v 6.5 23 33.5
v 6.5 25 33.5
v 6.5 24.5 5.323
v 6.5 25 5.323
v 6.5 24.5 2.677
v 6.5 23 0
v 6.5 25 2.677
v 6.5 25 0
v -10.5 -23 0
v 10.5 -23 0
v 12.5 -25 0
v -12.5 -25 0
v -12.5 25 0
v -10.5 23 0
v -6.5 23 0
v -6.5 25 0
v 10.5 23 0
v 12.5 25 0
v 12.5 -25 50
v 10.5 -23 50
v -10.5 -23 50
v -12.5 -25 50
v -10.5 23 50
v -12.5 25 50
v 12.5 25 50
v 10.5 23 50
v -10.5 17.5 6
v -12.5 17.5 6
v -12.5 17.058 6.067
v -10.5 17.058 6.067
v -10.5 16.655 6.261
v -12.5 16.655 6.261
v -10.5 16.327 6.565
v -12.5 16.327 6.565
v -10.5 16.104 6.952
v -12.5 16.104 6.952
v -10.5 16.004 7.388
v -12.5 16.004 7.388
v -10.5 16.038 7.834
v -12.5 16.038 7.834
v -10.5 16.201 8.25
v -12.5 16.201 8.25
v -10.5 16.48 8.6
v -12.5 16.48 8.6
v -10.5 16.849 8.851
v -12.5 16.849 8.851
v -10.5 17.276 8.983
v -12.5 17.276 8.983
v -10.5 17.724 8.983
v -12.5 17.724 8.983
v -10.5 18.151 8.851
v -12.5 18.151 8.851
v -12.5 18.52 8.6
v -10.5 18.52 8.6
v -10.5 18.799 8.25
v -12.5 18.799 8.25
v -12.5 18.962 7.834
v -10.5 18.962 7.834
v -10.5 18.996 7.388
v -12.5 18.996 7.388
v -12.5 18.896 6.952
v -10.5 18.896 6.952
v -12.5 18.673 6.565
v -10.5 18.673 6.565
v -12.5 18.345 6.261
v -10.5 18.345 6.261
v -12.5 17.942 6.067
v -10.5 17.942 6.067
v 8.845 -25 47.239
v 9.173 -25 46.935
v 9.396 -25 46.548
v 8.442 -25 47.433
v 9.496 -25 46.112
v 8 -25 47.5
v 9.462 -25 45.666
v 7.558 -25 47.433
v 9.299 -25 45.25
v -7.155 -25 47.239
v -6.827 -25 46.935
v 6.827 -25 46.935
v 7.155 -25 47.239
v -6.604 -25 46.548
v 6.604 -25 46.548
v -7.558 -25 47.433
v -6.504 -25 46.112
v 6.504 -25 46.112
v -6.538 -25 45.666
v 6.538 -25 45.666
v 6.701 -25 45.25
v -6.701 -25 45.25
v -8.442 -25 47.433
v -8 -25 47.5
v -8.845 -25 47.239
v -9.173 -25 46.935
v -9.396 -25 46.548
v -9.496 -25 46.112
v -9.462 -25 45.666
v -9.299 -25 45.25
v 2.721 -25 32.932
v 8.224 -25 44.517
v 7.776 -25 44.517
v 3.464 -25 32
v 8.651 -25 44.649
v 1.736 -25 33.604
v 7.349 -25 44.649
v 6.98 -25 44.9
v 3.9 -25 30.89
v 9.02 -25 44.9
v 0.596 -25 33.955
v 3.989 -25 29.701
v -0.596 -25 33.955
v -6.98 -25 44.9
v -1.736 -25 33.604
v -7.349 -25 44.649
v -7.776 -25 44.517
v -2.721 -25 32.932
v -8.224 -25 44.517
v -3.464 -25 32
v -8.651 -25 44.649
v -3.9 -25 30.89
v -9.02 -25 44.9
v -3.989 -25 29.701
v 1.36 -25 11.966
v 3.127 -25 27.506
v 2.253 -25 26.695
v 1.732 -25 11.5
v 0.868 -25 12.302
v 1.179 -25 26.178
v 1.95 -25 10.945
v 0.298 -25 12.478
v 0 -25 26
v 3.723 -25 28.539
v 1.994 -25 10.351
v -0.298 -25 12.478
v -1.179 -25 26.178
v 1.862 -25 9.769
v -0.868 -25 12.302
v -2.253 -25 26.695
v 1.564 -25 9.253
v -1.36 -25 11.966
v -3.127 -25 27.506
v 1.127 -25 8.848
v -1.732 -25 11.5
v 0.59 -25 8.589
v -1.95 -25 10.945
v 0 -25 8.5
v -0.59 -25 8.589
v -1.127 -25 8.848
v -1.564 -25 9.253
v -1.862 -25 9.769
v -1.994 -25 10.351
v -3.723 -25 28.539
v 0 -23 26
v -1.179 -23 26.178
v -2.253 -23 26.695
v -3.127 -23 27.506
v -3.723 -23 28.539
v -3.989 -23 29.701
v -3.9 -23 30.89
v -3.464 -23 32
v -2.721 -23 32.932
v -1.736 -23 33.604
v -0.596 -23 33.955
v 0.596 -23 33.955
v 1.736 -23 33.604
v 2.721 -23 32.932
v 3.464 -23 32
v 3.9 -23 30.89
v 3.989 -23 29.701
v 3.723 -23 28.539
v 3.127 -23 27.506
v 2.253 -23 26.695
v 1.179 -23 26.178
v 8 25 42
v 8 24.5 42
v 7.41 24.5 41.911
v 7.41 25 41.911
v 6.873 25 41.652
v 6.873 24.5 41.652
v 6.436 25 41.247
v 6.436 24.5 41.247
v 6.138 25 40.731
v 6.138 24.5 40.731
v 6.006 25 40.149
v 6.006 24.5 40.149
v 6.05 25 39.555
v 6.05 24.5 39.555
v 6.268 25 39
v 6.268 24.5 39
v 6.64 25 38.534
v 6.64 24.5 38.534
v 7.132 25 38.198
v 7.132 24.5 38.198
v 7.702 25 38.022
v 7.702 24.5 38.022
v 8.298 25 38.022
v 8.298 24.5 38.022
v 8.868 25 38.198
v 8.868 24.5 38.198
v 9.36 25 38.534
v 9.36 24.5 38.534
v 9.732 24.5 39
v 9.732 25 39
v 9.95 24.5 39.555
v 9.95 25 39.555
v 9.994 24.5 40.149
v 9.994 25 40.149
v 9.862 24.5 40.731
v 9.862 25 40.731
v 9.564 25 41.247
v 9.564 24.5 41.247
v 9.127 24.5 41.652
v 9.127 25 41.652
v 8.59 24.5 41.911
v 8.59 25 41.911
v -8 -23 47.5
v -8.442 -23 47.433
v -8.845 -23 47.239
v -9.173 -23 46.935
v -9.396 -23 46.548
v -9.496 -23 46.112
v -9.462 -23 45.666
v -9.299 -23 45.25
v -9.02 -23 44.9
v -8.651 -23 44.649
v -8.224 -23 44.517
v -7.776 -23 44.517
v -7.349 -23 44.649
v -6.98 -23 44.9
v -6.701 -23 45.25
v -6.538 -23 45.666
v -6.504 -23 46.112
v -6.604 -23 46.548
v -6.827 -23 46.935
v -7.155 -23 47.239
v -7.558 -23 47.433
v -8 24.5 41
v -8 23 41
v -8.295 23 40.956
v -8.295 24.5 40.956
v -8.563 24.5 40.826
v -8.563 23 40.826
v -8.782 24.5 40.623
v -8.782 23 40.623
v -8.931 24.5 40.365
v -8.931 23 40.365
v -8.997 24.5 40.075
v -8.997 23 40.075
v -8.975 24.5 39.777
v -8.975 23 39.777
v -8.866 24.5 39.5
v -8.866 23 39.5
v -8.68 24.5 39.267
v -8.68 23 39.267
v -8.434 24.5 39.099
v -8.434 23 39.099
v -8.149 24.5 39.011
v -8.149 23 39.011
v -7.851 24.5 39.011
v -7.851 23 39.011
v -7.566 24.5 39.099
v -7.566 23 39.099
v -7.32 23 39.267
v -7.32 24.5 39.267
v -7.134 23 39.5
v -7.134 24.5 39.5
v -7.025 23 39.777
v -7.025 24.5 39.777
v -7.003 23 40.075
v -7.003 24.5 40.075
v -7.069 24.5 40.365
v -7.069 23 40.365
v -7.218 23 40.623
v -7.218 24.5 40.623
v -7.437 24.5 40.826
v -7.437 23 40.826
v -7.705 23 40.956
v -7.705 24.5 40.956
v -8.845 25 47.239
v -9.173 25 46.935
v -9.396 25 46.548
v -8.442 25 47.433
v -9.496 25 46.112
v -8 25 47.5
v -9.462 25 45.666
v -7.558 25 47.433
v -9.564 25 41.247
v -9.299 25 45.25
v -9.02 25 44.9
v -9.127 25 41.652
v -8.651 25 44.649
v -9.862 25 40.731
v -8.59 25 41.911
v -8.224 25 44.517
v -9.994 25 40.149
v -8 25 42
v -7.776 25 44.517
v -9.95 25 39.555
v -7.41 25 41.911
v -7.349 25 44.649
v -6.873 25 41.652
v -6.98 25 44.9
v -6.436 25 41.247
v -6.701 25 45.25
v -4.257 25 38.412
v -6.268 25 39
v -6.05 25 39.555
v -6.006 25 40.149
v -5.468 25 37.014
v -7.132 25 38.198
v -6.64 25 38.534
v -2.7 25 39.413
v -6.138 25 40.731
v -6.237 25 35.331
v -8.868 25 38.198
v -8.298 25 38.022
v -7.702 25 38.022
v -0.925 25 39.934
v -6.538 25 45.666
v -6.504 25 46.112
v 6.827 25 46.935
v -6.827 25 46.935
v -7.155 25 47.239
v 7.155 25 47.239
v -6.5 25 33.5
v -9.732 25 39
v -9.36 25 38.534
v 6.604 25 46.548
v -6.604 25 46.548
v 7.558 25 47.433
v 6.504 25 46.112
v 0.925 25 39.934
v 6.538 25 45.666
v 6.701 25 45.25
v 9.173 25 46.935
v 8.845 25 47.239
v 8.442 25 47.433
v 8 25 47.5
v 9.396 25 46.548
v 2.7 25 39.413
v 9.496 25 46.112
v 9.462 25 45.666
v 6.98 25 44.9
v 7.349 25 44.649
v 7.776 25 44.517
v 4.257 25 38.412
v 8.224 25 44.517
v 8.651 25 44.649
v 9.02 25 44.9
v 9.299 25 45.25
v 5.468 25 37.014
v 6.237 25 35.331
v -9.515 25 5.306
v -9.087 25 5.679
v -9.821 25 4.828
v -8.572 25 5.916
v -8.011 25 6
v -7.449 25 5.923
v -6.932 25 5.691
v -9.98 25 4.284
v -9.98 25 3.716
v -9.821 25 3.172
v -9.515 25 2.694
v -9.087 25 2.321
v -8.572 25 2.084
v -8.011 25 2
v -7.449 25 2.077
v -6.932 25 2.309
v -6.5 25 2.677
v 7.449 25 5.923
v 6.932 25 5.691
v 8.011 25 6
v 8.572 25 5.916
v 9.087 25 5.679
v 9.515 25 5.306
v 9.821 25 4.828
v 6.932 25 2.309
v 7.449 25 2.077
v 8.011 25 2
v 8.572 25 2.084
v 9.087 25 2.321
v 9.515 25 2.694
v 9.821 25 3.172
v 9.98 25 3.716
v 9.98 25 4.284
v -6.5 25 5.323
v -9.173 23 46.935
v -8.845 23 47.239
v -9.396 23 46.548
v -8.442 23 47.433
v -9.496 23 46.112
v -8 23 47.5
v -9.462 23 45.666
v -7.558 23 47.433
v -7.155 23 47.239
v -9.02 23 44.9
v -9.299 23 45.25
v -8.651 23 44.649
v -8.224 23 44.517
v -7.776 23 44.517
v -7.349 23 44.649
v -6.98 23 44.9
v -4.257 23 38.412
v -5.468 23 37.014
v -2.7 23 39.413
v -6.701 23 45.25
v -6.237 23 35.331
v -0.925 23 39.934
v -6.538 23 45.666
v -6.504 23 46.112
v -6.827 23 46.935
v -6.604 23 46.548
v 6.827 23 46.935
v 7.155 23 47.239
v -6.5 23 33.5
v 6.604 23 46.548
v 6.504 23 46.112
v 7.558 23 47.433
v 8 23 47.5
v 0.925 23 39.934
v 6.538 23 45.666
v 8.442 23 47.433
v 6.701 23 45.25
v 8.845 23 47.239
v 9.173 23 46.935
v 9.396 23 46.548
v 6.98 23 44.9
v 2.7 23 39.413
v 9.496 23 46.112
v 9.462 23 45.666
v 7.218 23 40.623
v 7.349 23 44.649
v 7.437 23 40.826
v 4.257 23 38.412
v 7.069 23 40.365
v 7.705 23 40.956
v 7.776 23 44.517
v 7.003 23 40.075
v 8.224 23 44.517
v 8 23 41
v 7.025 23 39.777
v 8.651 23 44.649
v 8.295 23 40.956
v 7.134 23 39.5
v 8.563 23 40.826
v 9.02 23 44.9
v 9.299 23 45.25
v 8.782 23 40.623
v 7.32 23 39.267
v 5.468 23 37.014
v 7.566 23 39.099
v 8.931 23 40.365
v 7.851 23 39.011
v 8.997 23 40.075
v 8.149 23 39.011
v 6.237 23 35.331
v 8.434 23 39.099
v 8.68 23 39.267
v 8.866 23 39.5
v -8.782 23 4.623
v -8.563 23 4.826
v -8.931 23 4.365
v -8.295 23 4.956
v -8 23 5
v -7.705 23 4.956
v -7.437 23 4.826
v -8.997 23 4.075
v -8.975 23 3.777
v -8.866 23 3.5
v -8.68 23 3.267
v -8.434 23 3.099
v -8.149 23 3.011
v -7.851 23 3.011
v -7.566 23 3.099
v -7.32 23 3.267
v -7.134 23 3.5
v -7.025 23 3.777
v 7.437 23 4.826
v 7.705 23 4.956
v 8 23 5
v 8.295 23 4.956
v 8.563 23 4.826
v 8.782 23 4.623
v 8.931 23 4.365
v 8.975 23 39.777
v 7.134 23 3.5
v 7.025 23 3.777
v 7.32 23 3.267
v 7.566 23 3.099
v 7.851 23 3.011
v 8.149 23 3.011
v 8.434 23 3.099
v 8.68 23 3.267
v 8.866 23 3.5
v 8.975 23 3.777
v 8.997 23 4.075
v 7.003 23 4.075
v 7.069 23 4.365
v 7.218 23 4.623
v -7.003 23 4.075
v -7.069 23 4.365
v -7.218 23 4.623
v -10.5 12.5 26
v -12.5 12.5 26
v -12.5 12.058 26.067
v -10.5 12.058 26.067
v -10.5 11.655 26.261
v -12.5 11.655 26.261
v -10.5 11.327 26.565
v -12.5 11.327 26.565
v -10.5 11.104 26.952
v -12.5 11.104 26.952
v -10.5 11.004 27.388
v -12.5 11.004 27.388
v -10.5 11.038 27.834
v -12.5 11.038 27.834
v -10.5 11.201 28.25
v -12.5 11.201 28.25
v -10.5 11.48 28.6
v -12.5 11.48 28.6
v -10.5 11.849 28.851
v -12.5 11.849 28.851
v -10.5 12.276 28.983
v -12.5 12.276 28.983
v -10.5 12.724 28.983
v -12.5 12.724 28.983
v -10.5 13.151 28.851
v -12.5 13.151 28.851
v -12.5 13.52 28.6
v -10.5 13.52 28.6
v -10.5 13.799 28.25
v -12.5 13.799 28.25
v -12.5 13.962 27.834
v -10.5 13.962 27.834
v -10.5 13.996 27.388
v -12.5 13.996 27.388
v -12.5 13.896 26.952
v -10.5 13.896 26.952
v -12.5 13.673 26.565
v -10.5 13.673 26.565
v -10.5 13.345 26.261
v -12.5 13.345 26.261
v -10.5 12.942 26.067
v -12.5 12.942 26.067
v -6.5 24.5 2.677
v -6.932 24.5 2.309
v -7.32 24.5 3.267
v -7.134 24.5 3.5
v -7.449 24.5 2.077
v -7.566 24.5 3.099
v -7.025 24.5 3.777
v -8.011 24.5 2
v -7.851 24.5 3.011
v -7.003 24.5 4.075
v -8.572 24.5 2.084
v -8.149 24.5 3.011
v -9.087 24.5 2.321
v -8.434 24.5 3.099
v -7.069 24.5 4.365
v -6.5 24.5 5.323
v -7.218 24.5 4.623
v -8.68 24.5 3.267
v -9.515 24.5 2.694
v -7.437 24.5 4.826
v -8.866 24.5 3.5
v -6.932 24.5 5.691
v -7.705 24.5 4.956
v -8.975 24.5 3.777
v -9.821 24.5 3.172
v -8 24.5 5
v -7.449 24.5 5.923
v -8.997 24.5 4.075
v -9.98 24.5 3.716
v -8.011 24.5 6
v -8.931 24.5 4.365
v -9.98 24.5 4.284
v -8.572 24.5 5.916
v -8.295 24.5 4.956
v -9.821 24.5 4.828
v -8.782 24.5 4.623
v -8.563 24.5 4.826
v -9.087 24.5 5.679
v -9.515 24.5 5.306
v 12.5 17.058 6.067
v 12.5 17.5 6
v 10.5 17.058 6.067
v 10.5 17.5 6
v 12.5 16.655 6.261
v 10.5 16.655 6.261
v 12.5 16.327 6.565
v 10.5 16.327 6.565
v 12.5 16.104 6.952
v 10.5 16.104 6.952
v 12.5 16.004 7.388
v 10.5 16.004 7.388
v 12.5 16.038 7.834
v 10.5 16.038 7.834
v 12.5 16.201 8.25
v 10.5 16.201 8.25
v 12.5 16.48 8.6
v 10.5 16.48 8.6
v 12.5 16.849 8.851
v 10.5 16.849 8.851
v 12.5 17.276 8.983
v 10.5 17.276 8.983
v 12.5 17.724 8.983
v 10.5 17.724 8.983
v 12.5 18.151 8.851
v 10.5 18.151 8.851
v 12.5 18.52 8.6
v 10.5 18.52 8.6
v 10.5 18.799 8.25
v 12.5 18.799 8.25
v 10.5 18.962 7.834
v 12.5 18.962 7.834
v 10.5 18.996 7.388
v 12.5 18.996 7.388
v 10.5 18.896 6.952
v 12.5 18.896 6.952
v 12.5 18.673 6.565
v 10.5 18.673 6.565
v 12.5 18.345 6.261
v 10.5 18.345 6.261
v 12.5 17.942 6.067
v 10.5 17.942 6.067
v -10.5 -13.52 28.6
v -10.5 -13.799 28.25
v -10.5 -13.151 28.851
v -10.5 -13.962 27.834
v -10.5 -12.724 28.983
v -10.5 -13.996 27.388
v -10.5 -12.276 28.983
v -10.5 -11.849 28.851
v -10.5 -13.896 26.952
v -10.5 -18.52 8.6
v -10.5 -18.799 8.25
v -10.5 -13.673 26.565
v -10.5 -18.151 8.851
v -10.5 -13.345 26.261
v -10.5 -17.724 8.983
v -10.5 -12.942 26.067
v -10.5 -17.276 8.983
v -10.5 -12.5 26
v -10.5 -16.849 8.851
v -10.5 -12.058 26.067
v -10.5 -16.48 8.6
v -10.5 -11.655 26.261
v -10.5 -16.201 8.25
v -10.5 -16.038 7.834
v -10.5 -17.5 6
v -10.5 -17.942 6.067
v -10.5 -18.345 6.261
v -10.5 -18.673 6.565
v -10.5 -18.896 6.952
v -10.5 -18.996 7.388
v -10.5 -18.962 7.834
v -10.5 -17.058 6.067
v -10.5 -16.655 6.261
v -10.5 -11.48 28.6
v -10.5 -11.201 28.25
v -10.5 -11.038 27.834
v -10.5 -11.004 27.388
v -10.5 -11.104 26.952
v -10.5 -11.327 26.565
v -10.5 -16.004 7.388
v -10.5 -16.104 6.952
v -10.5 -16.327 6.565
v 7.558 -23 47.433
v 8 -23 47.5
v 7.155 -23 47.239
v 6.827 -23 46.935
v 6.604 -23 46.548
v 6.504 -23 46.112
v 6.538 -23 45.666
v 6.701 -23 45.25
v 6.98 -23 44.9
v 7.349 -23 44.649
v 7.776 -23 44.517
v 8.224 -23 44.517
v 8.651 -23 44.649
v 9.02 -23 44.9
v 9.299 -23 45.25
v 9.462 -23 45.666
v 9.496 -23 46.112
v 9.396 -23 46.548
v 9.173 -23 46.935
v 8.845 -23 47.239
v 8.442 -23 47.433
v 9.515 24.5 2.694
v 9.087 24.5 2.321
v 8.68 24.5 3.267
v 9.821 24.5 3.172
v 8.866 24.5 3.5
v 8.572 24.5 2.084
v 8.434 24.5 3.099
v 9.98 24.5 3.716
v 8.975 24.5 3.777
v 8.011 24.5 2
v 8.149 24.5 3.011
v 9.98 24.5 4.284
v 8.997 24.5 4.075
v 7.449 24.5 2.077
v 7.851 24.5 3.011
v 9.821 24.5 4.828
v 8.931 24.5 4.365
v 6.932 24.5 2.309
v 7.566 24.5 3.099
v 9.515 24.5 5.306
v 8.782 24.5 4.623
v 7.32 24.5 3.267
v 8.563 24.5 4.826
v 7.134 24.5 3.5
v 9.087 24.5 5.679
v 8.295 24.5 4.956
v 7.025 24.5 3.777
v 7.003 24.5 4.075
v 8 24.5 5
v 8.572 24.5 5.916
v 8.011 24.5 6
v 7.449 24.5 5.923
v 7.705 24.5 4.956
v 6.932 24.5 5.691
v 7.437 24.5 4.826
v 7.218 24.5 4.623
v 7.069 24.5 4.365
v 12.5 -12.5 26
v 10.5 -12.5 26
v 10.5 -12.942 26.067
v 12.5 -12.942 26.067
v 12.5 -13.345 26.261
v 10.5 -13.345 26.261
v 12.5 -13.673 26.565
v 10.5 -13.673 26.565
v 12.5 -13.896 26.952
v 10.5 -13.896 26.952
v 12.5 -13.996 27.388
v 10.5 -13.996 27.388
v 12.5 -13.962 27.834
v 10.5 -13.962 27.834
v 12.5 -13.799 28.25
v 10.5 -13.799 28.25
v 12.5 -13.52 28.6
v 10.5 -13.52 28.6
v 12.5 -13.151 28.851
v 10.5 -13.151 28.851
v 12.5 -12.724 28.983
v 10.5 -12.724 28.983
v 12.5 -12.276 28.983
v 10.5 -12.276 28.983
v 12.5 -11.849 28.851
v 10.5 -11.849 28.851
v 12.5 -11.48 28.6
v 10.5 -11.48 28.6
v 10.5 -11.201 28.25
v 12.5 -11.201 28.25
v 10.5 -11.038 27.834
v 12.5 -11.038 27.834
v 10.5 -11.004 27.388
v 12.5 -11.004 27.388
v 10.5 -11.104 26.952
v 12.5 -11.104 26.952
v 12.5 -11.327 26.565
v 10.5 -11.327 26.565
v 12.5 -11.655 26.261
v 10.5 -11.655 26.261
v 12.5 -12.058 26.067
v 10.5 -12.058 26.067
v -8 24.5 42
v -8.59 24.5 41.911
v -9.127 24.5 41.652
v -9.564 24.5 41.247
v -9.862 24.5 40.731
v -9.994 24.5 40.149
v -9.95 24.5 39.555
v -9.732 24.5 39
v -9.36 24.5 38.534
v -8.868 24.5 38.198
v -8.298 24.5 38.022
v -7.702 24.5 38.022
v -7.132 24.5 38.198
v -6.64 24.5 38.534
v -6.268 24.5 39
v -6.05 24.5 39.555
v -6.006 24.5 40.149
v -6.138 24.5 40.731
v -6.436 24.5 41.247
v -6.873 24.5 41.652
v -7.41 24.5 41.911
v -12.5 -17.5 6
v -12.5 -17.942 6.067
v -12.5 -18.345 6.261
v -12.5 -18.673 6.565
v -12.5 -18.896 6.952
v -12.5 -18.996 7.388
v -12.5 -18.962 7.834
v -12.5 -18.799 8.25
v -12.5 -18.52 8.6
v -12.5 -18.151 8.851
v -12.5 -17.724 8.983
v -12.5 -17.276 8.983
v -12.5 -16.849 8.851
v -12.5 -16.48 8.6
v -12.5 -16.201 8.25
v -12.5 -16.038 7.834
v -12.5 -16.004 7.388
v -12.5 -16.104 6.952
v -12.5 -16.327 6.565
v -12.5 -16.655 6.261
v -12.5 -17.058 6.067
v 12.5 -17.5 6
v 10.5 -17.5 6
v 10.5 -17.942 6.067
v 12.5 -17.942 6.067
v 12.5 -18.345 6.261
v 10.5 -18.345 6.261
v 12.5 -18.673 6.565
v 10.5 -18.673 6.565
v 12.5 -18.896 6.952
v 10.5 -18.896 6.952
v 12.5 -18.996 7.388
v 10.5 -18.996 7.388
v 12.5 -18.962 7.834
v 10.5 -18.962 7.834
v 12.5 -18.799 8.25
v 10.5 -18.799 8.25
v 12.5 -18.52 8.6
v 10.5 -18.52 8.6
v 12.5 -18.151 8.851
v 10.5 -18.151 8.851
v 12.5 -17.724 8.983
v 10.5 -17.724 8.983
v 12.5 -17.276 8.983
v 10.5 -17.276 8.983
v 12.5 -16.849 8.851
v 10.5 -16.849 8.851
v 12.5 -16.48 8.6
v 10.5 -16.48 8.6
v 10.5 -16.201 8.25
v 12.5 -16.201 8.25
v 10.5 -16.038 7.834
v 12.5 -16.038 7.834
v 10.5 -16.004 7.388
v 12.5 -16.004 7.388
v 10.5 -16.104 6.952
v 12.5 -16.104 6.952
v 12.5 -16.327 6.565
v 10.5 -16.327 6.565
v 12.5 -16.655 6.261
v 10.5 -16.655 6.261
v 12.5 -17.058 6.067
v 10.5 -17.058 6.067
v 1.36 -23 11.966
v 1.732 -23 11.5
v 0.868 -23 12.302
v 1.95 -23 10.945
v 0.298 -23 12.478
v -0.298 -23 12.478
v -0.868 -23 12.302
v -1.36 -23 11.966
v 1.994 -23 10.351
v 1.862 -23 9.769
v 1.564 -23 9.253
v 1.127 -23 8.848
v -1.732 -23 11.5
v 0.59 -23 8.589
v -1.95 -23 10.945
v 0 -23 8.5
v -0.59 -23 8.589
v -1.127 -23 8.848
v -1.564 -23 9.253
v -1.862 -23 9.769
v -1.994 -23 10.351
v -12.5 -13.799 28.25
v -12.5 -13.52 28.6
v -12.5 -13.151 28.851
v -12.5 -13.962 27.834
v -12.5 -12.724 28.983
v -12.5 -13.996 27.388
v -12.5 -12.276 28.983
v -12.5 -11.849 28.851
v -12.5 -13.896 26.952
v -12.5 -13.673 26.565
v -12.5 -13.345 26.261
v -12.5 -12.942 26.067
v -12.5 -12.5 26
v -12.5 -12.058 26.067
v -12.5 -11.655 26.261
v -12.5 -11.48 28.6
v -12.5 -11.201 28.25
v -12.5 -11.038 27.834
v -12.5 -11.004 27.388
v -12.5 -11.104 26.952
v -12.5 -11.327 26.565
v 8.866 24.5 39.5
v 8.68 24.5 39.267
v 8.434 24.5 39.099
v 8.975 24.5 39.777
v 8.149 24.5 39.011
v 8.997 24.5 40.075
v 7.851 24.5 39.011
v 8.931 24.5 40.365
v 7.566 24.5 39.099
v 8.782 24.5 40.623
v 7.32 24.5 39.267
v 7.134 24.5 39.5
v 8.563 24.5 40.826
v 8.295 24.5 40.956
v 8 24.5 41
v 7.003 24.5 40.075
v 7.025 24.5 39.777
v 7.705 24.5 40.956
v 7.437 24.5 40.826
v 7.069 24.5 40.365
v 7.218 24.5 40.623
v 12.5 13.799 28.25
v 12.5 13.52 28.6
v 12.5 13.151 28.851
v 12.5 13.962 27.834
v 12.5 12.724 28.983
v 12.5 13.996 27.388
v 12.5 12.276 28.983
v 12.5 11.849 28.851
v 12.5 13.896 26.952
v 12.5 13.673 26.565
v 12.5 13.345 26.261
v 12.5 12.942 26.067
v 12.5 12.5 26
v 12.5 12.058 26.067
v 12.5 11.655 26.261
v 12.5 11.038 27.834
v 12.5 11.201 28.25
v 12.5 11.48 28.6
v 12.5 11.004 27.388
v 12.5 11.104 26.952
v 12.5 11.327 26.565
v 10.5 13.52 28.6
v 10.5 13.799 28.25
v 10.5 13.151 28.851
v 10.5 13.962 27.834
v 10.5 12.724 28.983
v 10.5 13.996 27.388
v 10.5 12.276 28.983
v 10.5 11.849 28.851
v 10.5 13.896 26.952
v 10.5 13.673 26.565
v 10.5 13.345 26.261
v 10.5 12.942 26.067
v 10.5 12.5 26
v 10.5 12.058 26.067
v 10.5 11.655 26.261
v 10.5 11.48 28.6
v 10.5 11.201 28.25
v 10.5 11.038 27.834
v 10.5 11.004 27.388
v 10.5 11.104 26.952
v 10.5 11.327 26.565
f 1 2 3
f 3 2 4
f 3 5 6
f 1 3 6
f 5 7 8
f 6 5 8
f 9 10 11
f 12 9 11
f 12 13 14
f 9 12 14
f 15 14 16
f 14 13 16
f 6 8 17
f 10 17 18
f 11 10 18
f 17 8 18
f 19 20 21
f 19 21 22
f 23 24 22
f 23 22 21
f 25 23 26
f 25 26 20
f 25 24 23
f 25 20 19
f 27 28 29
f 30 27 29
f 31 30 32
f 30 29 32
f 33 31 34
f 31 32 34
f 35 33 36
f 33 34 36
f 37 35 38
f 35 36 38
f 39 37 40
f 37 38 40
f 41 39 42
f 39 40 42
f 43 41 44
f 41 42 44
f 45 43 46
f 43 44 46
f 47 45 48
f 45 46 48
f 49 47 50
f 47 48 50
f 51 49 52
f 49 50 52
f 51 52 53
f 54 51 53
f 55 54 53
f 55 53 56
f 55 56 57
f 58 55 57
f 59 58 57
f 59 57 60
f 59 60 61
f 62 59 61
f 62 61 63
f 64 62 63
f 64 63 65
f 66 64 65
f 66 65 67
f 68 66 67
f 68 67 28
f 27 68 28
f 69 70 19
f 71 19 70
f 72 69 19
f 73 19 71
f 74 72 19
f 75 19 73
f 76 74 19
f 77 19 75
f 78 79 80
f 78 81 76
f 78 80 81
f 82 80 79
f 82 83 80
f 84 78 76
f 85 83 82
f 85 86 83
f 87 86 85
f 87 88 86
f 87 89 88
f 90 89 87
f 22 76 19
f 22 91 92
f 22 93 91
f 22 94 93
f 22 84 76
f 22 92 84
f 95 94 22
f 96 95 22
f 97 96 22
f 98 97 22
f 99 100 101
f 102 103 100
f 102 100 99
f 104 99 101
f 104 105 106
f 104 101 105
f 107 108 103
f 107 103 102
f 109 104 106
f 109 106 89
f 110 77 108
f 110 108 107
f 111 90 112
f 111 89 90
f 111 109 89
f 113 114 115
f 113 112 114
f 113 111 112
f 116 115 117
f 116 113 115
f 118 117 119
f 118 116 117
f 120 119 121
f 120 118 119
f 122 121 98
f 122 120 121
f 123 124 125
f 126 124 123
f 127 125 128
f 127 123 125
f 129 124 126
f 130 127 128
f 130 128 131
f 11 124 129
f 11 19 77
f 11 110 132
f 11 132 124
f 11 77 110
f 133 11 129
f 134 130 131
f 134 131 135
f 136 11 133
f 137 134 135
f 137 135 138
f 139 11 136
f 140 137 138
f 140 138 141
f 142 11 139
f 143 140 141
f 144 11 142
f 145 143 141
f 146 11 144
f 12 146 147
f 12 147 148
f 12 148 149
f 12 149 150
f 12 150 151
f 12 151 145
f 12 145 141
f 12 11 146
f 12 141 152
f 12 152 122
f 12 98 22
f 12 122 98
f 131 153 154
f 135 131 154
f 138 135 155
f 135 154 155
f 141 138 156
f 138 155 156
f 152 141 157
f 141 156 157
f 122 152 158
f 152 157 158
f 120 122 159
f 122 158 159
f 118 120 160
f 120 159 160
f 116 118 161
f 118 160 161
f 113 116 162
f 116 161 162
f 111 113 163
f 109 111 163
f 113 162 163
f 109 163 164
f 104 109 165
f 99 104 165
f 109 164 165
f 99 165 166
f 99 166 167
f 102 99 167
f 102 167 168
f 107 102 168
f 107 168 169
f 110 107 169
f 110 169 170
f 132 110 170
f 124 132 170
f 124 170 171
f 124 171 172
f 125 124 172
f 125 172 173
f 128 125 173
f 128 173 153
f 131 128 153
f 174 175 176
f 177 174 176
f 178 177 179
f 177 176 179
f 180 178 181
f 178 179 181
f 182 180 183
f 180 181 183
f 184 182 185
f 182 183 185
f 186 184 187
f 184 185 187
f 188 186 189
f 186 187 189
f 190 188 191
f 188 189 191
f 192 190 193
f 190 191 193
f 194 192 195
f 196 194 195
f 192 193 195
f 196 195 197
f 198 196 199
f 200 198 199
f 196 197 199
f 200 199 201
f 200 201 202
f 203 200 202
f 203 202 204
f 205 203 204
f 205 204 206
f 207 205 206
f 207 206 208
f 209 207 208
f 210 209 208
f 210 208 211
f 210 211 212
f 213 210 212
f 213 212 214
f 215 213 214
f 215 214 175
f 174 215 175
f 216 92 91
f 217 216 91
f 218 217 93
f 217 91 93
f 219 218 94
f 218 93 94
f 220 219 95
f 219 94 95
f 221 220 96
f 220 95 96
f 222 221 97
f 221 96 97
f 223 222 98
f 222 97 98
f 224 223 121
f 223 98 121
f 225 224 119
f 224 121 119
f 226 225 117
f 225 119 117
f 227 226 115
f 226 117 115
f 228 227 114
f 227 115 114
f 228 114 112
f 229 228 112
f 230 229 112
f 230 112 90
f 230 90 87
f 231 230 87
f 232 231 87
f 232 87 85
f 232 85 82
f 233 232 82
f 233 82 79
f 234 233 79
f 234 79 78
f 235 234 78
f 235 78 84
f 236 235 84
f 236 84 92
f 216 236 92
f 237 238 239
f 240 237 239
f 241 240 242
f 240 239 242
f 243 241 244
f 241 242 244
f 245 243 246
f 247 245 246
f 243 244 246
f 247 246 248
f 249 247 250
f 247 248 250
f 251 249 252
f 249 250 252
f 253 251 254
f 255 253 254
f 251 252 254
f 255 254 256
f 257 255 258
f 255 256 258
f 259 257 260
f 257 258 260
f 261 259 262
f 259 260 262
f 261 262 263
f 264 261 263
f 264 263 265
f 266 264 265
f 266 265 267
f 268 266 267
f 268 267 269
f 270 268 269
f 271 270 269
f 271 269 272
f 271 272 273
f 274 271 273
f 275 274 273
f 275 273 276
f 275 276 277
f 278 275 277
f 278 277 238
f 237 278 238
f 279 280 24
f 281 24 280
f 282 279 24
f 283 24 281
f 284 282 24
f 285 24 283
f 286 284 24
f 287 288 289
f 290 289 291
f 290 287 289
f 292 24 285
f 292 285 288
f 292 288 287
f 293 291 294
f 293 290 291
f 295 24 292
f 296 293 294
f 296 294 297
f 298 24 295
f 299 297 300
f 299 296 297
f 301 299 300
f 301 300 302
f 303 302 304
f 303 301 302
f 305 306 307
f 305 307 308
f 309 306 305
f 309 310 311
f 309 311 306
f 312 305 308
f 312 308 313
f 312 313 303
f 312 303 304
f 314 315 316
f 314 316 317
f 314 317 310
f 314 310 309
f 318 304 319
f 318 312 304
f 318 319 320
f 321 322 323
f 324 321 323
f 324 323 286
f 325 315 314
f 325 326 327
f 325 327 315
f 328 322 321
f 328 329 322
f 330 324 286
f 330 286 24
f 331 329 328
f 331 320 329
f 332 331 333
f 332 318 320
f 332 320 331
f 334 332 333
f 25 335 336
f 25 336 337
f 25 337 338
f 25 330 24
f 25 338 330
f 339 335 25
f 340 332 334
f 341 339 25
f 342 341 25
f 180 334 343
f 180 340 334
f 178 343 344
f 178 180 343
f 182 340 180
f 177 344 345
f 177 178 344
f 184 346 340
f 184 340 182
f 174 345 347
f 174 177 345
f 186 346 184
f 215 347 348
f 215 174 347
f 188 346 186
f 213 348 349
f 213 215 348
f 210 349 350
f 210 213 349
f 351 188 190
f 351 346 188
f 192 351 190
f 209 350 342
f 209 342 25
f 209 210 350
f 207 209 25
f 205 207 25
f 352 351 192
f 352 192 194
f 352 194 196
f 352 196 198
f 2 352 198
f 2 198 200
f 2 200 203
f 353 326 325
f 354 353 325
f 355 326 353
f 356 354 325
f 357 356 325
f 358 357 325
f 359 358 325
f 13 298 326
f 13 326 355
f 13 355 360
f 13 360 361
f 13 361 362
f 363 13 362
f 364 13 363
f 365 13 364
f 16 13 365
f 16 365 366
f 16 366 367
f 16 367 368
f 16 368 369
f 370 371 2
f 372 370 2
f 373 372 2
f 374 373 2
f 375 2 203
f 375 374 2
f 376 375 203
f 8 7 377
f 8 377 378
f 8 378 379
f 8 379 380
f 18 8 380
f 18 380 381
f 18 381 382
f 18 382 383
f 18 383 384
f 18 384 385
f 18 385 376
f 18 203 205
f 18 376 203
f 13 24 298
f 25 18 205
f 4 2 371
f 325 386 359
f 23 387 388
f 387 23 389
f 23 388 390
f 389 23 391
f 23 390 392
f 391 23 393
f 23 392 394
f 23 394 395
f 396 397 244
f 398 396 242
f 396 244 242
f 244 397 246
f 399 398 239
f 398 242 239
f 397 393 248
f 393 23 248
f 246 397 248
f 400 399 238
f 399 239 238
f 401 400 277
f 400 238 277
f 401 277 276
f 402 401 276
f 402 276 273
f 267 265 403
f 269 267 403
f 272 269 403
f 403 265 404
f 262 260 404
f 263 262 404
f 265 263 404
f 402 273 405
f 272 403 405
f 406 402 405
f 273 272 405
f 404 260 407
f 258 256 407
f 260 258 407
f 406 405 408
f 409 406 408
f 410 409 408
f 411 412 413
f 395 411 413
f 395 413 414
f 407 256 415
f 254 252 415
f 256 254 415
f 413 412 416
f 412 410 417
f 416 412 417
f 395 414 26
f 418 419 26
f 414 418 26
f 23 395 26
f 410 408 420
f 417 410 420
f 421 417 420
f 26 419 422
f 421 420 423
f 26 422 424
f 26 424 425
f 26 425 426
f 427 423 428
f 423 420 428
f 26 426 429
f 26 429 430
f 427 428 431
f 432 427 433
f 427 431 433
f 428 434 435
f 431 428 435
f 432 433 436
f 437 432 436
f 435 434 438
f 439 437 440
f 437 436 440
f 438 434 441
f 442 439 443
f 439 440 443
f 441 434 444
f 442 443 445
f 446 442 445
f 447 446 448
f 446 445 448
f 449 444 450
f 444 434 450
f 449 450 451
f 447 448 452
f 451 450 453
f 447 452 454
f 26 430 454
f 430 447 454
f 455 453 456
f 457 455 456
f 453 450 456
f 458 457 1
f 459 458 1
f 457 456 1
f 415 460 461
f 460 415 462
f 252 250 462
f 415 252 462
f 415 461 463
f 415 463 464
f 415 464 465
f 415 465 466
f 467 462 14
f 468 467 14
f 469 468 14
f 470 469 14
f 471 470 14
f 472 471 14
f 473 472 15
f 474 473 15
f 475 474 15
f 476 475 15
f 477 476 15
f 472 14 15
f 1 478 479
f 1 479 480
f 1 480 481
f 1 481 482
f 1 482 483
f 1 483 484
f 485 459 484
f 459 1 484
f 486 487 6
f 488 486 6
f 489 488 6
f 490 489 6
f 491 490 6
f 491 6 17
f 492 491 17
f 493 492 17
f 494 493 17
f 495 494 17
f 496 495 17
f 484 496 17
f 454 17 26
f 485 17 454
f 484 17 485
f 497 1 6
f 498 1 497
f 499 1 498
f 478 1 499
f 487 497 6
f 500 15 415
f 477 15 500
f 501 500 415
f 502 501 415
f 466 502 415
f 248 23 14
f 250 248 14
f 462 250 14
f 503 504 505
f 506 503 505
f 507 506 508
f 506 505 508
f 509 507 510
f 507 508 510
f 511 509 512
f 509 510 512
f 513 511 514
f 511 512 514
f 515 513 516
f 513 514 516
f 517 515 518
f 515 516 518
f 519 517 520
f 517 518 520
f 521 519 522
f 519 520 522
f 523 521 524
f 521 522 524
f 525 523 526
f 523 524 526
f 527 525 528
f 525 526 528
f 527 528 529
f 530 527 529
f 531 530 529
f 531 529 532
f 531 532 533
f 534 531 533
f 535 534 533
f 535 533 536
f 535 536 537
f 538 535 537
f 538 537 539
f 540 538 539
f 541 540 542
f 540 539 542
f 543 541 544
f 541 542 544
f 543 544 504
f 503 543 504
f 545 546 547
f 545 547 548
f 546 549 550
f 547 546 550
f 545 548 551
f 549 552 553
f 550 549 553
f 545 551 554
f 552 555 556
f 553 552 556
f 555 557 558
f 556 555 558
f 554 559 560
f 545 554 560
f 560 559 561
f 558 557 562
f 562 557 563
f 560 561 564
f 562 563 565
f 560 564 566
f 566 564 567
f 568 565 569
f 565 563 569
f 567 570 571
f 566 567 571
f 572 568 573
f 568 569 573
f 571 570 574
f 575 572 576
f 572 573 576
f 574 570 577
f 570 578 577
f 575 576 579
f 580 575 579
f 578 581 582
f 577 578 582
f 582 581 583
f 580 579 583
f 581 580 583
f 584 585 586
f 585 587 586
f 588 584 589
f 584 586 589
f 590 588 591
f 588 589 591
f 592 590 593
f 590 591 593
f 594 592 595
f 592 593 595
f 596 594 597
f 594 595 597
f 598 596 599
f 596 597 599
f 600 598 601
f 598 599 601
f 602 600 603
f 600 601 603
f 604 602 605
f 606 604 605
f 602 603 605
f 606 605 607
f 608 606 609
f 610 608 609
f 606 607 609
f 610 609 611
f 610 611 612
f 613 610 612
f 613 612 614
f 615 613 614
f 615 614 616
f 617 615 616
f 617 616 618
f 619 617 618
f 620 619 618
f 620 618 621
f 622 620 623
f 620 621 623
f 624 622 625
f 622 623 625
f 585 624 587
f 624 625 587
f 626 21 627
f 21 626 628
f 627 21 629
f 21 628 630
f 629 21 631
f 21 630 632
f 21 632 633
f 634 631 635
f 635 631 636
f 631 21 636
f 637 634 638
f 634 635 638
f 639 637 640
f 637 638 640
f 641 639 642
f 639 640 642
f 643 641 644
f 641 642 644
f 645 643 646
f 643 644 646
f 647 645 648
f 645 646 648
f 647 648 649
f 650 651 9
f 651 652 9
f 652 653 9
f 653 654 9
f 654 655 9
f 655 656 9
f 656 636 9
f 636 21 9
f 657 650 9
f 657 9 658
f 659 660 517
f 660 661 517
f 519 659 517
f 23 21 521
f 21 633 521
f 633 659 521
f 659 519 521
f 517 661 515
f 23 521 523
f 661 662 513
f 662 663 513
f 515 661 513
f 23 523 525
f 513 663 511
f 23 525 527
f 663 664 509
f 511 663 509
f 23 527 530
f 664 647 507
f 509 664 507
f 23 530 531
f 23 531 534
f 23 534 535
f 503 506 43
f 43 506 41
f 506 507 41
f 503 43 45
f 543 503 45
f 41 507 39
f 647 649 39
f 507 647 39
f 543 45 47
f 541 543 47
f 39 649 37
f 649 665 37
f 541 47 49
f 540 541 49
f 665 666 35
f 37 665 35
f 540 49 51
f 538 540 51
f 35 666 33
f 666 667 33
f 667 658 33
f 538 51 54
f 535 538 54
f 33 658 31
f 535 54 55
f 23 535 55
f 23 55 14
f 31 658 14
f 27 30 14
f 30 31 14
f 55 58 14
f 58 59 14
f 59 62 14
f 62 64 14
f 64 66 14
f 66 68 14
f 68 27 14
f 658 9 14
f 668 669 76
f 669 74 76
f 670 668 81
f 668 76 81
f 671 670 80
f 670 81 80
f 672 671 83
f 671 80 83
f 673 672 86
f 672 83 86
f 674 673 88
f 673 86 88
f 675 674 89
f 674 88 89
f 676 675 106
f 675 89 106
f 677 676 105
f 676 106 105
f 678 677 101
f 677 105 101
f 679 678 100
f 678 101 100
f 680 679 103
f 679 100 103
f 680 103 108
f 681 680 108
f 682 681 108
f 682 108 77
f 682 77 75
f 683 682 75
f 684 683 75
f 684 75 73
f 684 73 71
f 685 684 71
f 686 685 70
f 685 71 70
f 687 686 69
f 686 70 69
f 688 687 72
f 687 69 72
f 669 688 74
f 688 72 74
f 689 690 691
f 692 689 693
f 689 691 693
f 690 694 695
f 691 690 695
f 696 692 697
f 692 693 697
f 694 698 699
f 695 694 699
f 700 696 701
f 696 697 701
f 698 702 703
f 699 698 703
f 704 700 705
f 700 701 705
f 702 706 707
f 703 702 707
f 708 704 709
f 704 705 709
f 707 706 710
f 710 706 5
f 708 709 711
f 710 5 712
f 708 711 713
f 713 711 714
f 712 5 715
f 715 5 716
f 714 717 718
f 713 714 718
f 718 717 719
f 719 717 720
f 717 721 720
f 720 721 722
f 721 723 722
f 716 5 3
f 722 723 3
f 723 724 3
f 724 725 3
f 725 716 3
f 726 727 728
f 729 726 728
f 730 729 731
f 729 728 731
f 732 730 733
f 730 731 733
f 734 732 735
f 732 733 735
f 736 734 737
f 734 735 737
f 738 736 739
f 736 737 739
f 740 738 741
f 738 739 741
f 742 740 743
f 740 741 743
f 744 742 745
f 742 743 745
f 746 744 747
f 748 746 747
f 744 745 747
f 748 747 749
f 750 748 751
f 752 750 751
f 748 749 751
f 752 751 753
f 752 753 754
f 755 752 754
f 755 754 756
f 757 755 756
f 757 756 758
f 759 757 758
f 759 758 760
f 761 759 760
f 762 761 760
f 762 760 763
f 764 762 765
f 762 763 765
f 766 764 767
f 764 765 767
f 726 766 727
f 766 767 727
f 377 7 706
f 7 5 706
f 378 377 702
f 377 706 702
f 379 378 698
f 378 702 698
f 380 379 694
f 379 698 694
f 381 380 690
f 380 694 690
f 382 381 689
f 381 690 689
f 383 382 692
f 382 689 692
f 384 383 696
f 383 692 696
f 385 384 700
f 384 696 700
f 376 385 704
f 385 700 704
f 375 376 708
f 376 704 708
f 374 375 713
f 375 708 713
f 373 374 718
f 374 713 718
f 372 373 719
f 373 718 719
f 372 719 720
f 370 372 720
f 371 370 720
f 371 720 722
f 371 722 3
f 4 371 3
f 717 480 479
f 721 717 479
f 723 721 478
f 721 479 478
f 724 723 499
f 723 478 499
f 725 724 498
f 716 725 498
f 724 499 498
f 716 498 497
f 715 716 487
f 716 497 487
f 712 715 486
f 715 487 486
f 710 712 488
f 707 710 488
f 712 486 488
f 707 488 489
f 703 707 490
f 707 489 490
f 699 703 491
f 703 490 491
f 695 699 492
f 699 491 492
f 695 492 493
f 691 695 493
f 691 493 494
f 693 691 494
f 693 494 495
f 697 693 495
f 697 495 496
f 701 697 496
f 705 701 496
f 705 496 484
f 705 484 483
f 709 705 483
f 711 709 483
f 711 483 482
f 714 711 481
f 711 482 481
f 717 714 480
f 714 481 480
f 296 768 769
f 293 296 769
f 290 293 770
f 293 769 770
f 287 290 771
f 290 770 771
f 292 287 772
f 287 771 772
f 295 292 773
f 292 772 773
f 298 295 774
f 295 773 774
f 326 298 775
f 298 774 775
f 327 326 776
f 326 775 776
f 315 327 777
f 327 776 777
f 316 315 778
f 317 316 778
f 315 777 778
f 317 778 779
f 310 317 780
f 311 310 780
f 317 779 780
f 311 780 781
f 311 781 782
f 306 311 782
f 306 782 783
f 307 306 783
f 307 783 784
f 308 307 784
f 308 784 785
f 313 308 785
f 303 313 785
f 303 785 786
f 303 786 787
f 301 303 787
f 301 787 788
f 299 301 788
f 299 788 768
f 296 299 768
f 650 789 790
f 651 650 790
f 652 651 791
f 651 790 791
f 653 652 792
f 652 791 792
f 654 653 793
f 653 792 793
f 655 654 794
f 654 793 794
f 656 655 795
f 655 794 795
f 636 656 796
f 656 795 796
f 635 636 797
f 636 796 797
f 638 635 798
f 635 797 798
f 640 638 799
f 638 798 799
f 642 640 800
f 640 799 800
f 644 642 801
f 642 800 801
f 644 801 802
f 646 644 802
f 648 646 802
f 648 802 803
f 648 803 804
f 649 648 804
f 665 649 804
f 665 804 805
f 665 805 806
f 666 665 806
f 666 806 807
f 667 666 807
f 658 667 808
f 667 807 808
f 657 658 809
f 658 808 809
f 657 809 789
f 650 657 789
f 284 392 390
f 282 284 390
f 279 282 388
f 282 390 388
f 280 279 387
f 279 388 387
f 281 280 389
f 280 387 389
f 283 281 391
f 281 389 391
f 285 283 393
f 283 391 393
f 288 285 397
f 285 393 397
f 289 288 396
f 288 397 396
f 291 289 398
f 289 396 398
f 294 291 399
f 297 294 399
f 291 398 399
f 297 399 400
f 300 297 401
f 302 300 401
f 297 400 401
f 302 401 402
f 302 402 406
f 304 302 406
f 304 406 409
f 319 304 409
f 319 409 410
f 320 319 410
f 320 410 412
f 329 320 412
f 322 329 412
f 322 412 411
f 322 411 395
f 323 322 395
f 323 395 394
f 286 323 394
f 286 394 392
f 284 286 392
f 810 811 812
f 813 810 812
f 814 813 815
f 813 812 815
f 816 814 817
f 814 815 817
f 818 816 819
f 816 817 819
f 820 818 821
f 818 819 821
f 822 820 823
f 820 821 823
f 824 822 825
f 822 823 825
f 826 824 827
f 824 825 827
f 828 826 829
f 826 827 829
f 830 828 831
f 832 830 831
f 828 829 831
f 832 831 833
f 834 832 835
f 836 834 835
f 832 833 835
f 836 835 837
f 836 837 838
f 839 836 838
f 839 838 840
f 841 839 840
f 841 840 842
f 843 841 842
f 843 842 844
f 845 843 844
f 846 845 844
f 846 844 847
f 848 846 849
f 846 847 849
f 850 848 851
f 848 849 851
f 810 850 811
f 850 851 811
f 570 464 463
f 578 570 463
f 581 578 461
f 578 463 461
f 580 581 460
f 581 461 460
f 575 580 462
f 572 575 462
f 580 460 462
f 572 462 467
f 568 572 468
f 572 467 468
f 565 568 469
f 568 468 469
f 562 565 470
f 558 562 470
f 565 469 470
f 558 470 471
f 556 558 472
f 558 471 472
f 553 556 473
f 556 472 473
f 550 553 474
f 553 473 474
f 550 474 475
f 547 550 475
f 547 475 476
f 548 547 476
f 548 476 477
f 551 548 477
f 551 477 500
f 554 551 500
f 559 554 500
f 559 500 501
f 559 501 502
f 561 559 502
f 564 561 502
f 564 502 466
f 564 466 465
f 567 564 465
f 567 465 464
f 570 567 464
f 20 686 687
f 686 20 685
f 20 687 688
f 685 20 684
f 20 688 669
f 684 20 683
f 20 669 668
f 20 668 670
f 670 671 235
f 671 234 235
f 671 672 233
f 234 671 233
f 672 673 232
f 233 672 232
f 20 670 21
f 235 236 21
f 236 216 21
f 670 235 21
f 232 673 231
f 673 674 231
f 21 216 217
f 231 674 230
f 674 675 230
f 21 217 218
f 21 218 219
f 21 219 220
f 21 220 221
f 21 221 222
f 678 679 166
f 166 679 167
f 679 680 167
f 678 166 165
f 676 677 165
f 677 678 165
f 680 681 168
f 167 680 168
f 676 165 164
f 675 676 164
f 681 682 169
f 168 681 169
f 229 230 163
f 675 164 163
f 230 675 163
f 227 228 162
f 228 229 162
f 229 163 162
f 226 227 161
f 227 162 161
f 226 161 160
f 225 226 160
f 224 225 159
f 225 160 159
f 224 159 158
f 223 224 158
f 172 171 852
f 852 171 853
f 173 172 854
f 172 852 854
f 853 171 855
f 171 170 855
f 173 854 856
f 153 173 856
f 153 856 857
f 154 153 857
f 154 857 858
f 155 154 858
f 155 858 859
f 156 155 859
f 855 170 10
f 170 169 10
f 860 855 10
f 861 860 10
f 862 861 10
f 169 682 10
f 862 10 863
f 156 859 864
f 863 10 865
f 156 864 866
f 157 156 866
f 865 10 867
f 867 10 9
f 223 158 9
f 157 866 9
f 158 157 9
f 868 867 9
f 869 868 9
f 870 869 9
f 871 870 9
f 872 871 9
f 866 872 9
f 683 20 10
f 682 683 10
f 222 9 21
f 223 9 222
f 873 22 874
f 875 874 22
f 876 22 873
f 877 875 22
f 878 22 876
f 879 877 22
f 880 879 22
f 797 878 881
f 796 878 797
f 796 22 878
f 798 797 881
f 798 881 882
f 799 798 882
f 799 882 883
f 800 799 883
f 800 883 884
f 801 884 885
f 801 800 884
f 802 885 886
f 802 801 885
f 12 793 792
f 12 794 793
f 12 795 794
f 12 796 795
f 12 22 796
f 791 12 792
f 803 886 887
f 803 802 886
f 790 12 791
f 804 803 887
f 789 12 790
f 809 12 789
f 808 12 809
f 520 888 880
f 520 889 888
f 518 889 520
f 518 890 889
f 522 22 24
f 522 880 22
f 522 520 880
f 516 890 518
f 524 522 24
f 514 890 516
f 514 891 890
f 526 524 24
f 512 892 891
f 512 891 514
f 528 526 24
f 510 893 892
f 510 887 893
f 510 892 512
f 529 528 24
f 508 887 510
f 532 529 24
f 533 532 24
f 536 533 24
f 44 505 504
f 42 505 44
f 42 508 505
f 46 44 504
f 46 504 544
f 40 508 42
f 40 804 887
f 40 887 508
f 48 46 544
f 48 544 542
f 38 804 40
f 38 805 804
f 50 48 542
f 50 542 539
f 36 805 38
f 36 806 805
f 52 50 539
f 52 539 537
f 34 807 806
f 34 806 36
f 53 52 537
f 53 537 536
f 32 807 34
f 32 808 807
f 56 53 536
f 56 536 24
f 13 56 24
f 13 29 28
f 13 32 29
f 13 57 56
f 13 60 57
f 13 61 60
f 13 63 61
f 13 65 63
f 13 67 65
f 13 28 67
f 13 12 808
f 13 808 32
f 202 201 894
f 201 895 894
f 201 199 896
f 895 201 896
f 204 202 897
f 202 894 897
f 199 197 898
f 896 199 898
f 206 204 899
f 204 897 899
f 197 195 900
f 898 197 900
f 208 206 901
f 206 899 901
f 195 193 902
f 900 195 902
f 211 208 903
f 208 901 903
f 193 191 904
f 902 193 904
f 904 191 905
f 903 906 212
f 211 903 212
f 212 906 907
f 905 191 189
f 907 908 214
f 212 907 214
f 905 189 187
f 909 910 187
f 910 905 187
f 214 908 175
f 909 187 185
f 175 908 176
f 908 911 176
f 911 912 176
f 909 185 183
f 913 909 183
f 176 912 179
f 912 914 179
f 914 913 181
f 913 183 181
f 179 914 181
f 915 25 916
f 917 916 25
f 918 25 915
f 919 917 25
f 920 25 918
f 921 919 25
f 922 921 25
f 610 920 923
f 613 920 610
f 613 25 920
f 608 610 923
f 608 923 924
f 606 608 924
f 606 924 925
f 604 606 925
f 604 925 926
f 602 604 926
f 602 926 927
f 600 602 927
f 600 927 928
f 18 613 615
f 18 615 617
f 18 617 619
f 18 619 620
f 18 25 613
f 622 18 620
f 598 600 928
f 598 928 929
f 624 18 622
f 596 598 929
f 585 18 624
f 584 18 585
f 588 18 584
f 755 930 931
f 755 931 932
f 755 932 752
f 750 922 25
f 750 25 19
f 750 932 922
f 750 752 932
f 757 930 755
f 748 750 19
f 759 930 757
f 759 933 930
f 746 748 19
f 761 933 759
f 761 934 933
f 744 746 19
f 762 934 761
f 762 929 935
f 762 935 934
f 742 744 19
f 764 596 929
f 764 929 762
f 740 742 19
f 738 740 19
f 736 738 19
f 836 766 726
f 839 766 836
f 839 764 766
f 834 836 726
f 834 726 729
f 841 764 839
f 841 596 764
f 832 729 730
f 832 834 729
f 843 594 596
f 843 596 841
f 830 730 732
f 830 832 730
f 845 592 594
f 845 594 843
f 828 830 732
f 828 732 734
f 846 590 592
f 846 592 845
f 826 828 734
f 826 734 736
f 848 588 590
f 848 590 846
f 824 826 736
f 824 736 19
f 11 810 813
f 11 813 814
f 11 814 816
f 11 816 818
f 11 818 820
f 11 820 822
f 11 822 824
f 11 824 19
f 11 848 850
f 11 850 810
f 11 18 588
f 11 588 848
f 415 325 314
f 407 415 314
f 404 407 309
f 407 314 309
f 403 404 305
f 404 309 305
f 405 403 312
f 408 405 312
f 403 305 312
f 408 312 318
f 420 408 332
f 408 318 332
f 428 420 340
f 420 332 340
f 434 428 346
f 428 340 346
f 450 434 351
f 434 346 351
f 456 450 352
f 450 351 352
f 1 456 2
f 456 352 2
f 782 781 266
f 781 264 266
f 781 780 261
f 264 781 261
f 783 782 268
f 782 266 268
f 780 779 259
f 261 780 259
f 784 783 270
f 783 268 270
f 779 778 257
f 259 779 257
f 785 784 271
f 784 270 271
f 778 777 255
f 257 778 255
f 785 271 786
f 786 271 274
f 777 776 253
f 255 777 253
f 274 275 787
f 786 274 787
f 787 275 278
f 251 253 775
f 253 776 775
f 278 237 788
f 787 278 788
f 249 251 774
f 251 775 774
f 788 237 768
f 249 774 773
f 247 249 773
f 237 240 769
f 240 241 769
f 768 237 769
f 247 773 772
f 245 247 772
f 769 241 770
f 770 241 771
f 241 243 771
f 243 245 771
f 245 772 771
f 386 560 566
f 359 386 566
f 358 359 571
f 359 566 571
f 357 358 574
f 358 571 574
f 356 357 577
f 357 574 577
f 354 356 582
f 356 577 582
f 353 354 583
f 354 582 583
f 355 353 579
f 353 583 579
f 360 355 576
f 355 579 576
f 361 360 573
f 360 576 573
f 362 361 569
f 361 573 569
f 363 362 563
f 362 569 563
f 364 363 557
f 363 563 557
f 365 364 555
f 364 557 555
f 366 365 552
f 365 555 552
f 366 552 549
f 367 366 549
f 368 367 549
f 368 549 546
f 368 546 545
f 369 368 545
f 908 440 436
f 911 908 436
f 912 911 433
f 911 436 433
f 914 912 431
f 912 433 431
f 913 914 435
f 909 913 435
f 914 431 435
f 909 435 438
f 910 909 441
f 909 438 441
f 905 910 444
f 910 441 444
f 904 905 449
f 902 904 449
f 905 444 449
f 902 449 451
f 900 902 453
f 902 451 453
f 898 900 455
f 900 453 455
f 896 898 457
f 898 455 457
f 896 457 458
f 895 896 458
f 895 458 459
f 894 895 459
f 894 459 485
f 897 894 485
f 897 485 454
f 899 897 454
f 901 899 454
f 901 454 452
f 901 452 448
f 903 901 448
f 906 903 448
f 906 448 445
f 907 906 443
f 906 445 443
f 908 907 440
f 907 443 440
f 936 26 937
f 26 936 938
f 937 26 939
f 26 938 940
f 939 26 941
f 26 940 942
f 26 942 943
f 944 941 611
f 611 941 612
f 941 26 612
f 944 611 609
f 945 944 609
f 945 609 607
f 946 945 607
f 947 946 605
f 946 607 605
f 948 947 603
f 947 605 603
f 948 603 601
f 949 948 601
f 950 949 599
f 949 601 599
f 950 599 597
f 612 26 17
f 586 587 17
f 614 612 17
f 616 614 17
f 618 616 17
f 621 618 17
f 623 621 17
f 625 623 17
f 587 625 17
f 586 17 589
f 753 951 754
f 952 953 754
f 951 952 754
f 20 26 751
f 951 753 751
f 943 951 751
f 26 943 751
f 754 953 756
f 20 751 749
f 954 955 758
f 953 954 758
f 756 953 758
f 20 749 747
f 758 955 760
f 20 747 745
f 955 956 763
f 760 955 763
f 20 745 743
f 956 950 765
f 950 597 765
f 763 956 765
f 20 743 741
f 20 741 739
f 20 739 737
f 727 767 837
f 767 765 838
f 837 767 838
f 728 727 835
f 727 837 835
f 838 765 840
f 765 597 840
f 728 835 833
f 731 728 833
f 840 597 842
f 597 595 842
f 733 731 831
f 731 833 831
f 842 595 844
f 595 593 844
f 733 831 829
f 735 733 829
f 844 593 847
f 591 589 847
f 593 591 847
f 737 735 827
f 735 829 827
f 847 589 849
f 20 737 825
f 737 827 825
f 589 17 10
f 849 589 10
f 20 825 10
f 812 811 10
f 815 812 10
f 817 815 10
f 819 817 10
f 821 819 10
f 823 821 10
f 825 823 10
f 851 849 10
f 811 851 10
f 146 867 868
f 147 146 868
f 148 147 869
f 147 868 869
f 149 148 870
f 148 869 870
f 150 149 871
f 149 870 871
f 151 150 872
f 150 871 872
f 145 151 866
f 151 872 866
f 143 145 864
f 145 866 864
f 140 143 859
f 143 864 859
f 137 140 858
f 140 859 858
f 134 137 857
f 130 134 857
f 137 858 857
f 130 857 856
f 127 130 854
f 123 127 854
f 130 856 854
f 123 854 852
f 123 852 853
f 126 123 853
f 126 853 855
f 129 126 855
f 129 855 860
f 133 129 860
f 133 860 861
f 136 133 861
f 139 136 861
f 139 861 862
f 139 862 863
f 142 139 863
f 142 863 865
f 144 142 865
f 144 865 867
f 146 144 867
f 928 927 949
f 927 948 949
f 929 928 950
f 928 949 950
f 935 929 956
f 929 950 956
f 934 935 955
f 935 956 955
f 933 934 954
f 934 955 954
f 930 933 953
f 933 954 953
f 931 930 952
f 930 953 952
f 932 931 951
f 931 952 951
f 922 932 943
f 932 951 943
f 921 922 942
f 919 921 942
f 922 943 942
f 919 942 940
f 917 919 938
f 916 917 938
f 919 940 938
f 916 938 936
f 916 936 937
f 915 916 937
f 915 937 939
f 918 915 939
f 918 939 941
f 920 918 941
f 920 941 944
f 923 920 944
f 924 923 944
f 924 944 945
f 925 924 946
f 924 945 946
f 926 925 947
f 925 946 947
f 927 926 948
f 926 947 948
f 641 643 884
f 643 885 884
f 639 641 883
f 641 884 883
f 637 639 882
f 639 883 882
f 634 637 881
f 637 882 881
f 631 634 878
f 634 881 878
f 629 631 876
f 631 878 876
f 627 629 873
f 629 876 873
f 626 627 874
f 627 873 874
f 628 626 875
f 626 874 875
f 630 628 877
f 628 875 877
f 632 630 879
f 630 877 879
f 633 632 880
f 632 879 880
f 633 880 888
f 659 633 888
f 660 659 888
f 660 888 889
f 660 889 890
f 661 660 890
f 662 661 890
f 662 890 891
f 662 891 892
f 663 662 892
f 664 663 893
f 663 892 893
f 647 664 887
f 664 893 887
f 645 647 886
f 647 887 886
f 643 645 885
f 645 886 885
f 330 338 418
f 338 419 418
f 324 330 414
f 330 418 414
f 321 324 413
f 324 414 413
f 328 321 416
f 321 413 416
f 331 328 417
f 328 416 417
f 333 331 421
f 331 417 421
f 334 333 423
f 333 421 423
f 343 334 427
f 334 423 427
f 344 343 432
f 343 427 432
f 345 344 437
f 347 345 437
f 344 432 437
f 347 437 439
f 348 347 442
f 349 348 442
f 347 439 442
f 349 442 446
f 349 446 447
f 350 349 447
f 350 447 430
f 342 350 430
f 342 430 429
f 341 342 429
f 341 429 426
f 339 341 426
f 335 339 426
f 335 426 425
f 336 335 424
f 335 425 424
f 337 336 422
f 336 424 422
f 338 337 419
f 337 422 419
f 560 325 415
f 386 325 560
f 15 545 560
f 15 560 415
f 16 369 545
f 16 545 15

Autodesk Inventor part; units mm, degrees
ref_plane "YZ Plane" through (0, 0, 0) normal (1, 0, 0) x (0, 1, 0)
ref_plane "XZ Plane" through (0, 0, 0) normal (0, 1, 0) x (-1, 0, 0)
ref_plane "XY Plane" through (0, 0, 0) normal (0, 0, 1) x (1, 0, 0)
sketch "スケッチ1" plane through (0, 0, 0) normal (0, 0, 1) x (1, 0, 0)
  line L0 (-12.5, 25) -> (12.5, 25)
  line L1 (12.5, 25) -> (12.5, -25)
  line L2 (12.5, -25) -> (-12.5, -25)
  line L3 (-12.5, -25) -> (-12.5, 25)
  line L4 (-10.5, 23) -> (10.5, 23)
  line L5 (10.5, 23) -> (10.5, -23)
  line L6 (10.5, -23) -> (-10.5, -23)
  line L7 (-10.5, -23) -> (-10.5, 23)
  point P0 (0, 0)
  dimension "d0" = 25
  dimension "d1" = 50
  dimension "d2" = 46
  dimension "d3" = 21
  dimension "d4" = 25
  dimension "d5" = 23
  dimension "d6" = 10.5
  dimension "d7" = 12.5
extrude "押し出し1" add sketch "スケッチ1" along normal blind 50
sketch "スケッチ2" plane through (-12.5, 25, 0) normal (0, 1, 0) x (1, 0, 0)
  line L0 (0, 0) -> (25, 0) projected
  line L1 (0, 0) -> (0, -50) projected
  arc A0 (6, -33.5) -> (19, -33.5) centre (12.5, -33.5) ccw
  line L2 (6, -33.5) -> (6, 0)
  line L3 (19, -33.5) -> (19, 0)
  point P0 (12.5, 0)
  dimension "d10" = 13
  dimension "d11" = 33.5
  dimension "d12" = 12.5
extrude "押し出し2" cut sketch "スケッチ2" against normal blind 2
sketch "スケッチ3" plane through (-12.5, 25, 50) normal (0, 1, 0) x (1, 0, 0)
  arc A0 (6, 16.5) -> (19, 16.5) centre (12.5, 16.5) ccw projected
  circle A1 centre (4.5, 10) radius 1
  circle A2 centre (4.5, 46) radius 1
  circle A3 centre (20.5, 46) radius 1
  circle A4 centre (20.5, 10) radius 1
  line L0 (19, 50) -> (25, 50) projected
  point P0 (12.5, 50)
  dimension "d15" = 6.5
  dimension "d16" = 6.5
  dimension "d17" = 2
  dimension "d18" = 8
  dimension "d19" = 8
  dimension "d20" = 8
  dimension "d21" = 8
  dimension "d22" = 29.5
  dimension "d23" = 29.5
  dimension "d119" = 4
hole "穴1" at (-8, 25, 4) at (8, 25, 4) at (8, 25, 40) at (-8, 25, 40) direction (0, -1, 0) diameter 2 depth 2 tip angle 118 counterbore diameter 4 counterbore depth 0.5
sketch "スケッチ4" plane through (-12.5, -25, 0) normal (0, -1, 0) x (1, 0, 0)
  line L0 (25, 0) -> (0, 0) projected
  line L1 (25, 0) -> (25, 50) projected
  circle A0 centre (12.5, 10.5) radius 2
  point P0 (12.5, 0)
  dimension "d31" = 4
  dimension "d32" = 12.5
  dimension "d33" = 10.5
hole "穴2" at (0, -25, 10.5) direction (0, 1, 0) diameter 4 end through all
sketch "スケッチ5" plane through (-12.5, 25, 50) normal (0, 1, 0) x (1, 0, 0)
  arc A0 (6, 16.5) -> (19, 16.5) centre (12.5, 16.5) ccw projected
  circle A1 centre (20.5, 4) radius 1.5
  circle A2 centre (4.5, 4) radius 1.5
  circle A3 centre (20.5, 10) radius 2 projected
  circle A4 centre (4.5, 10) radius 2 projected
  point P0 (12.5, 50)
  dimension "d46" = 8
  dimension "d47" = 8
  dimension "d57" = 3
  dimension "d120" = 6
  dimension "d121" = 6
hole "穴4" at (-8, 25, 46) at (8, 25, 46) direction (0, -1, 0) diameter 3 end through all
thread "ねじ1" size "M3x0.5" class "6H" standard "ANSI Metric M Profile" full length
thread "ねじ2" size "M3x0.5" class "6H" standard "ANSI Metric M Profile" full length
thread "ねじ3" size "M3x0.5" class "6H" standard "ANSI Metric M Profile" full length
thread "ねじ4" size "M3x0.5" class "6H" standard "ANSI Metric M Profile" full length
sketch "スケッチ7" plane through (-12.5, -25, 0) normal (0, -1, 0) x (1, 0, 0)
  line L0 (25, 0) -> (25, 50) projected
  circle A0 centre (12.5, 30) radius 4
  circle A1 centre (12.5, 10.5) radius 2 projected
  point P0 (12.5, 0)
  dimension "d79" = 8
  dimension "d80" = 12.5
  dimension "d118" = 19.5
hole "穴5" at (0, -25, 30) direction (0, 1, 0) diameter 8 end through all
sketch "スケッチ8" plane through (12.5, -25, 0) normal (1, 0, 0) x (0, 0, -1)
  line L0 (-50, 50) -> (-50, 0) projected
  circle A0 centre (-27.5, 37.5) radius 1.5
  circle A1 centre (-27.5, 12.5) radius 1.5
  circle A2 centre (-7.5, 42.5) radius 1.5
  circle A3 centre (-7.5, 7.5) radius 1.5
  line L1 (0, 50) -> (0, 0) projected
  line L2 (0, 50) -> (-50, 50) projected
  point P0 (0, 25)
  dimension "d88" = 25
  dimension "d90" = 3
  dimension "d101" = 35
  dimension "d104" = 20
  dimension "d105" = 20
  dimension "d113" = 50
  dimension "d114" = 7.5
  dimension "d115" = 7.5
  dimension "d116" = 7.5
  dimension "d117" = 5
hole "穴7" at (12.5, 12.5, 27.5) at (12.5, -12.5, 27.5) at (12.5, -17.5, 7.5) at (12.5, 17.5, 7.5) direction (-1, 0, 0) diameter 3 end through all
properties part number "07" material "アルミニウム 6061"
